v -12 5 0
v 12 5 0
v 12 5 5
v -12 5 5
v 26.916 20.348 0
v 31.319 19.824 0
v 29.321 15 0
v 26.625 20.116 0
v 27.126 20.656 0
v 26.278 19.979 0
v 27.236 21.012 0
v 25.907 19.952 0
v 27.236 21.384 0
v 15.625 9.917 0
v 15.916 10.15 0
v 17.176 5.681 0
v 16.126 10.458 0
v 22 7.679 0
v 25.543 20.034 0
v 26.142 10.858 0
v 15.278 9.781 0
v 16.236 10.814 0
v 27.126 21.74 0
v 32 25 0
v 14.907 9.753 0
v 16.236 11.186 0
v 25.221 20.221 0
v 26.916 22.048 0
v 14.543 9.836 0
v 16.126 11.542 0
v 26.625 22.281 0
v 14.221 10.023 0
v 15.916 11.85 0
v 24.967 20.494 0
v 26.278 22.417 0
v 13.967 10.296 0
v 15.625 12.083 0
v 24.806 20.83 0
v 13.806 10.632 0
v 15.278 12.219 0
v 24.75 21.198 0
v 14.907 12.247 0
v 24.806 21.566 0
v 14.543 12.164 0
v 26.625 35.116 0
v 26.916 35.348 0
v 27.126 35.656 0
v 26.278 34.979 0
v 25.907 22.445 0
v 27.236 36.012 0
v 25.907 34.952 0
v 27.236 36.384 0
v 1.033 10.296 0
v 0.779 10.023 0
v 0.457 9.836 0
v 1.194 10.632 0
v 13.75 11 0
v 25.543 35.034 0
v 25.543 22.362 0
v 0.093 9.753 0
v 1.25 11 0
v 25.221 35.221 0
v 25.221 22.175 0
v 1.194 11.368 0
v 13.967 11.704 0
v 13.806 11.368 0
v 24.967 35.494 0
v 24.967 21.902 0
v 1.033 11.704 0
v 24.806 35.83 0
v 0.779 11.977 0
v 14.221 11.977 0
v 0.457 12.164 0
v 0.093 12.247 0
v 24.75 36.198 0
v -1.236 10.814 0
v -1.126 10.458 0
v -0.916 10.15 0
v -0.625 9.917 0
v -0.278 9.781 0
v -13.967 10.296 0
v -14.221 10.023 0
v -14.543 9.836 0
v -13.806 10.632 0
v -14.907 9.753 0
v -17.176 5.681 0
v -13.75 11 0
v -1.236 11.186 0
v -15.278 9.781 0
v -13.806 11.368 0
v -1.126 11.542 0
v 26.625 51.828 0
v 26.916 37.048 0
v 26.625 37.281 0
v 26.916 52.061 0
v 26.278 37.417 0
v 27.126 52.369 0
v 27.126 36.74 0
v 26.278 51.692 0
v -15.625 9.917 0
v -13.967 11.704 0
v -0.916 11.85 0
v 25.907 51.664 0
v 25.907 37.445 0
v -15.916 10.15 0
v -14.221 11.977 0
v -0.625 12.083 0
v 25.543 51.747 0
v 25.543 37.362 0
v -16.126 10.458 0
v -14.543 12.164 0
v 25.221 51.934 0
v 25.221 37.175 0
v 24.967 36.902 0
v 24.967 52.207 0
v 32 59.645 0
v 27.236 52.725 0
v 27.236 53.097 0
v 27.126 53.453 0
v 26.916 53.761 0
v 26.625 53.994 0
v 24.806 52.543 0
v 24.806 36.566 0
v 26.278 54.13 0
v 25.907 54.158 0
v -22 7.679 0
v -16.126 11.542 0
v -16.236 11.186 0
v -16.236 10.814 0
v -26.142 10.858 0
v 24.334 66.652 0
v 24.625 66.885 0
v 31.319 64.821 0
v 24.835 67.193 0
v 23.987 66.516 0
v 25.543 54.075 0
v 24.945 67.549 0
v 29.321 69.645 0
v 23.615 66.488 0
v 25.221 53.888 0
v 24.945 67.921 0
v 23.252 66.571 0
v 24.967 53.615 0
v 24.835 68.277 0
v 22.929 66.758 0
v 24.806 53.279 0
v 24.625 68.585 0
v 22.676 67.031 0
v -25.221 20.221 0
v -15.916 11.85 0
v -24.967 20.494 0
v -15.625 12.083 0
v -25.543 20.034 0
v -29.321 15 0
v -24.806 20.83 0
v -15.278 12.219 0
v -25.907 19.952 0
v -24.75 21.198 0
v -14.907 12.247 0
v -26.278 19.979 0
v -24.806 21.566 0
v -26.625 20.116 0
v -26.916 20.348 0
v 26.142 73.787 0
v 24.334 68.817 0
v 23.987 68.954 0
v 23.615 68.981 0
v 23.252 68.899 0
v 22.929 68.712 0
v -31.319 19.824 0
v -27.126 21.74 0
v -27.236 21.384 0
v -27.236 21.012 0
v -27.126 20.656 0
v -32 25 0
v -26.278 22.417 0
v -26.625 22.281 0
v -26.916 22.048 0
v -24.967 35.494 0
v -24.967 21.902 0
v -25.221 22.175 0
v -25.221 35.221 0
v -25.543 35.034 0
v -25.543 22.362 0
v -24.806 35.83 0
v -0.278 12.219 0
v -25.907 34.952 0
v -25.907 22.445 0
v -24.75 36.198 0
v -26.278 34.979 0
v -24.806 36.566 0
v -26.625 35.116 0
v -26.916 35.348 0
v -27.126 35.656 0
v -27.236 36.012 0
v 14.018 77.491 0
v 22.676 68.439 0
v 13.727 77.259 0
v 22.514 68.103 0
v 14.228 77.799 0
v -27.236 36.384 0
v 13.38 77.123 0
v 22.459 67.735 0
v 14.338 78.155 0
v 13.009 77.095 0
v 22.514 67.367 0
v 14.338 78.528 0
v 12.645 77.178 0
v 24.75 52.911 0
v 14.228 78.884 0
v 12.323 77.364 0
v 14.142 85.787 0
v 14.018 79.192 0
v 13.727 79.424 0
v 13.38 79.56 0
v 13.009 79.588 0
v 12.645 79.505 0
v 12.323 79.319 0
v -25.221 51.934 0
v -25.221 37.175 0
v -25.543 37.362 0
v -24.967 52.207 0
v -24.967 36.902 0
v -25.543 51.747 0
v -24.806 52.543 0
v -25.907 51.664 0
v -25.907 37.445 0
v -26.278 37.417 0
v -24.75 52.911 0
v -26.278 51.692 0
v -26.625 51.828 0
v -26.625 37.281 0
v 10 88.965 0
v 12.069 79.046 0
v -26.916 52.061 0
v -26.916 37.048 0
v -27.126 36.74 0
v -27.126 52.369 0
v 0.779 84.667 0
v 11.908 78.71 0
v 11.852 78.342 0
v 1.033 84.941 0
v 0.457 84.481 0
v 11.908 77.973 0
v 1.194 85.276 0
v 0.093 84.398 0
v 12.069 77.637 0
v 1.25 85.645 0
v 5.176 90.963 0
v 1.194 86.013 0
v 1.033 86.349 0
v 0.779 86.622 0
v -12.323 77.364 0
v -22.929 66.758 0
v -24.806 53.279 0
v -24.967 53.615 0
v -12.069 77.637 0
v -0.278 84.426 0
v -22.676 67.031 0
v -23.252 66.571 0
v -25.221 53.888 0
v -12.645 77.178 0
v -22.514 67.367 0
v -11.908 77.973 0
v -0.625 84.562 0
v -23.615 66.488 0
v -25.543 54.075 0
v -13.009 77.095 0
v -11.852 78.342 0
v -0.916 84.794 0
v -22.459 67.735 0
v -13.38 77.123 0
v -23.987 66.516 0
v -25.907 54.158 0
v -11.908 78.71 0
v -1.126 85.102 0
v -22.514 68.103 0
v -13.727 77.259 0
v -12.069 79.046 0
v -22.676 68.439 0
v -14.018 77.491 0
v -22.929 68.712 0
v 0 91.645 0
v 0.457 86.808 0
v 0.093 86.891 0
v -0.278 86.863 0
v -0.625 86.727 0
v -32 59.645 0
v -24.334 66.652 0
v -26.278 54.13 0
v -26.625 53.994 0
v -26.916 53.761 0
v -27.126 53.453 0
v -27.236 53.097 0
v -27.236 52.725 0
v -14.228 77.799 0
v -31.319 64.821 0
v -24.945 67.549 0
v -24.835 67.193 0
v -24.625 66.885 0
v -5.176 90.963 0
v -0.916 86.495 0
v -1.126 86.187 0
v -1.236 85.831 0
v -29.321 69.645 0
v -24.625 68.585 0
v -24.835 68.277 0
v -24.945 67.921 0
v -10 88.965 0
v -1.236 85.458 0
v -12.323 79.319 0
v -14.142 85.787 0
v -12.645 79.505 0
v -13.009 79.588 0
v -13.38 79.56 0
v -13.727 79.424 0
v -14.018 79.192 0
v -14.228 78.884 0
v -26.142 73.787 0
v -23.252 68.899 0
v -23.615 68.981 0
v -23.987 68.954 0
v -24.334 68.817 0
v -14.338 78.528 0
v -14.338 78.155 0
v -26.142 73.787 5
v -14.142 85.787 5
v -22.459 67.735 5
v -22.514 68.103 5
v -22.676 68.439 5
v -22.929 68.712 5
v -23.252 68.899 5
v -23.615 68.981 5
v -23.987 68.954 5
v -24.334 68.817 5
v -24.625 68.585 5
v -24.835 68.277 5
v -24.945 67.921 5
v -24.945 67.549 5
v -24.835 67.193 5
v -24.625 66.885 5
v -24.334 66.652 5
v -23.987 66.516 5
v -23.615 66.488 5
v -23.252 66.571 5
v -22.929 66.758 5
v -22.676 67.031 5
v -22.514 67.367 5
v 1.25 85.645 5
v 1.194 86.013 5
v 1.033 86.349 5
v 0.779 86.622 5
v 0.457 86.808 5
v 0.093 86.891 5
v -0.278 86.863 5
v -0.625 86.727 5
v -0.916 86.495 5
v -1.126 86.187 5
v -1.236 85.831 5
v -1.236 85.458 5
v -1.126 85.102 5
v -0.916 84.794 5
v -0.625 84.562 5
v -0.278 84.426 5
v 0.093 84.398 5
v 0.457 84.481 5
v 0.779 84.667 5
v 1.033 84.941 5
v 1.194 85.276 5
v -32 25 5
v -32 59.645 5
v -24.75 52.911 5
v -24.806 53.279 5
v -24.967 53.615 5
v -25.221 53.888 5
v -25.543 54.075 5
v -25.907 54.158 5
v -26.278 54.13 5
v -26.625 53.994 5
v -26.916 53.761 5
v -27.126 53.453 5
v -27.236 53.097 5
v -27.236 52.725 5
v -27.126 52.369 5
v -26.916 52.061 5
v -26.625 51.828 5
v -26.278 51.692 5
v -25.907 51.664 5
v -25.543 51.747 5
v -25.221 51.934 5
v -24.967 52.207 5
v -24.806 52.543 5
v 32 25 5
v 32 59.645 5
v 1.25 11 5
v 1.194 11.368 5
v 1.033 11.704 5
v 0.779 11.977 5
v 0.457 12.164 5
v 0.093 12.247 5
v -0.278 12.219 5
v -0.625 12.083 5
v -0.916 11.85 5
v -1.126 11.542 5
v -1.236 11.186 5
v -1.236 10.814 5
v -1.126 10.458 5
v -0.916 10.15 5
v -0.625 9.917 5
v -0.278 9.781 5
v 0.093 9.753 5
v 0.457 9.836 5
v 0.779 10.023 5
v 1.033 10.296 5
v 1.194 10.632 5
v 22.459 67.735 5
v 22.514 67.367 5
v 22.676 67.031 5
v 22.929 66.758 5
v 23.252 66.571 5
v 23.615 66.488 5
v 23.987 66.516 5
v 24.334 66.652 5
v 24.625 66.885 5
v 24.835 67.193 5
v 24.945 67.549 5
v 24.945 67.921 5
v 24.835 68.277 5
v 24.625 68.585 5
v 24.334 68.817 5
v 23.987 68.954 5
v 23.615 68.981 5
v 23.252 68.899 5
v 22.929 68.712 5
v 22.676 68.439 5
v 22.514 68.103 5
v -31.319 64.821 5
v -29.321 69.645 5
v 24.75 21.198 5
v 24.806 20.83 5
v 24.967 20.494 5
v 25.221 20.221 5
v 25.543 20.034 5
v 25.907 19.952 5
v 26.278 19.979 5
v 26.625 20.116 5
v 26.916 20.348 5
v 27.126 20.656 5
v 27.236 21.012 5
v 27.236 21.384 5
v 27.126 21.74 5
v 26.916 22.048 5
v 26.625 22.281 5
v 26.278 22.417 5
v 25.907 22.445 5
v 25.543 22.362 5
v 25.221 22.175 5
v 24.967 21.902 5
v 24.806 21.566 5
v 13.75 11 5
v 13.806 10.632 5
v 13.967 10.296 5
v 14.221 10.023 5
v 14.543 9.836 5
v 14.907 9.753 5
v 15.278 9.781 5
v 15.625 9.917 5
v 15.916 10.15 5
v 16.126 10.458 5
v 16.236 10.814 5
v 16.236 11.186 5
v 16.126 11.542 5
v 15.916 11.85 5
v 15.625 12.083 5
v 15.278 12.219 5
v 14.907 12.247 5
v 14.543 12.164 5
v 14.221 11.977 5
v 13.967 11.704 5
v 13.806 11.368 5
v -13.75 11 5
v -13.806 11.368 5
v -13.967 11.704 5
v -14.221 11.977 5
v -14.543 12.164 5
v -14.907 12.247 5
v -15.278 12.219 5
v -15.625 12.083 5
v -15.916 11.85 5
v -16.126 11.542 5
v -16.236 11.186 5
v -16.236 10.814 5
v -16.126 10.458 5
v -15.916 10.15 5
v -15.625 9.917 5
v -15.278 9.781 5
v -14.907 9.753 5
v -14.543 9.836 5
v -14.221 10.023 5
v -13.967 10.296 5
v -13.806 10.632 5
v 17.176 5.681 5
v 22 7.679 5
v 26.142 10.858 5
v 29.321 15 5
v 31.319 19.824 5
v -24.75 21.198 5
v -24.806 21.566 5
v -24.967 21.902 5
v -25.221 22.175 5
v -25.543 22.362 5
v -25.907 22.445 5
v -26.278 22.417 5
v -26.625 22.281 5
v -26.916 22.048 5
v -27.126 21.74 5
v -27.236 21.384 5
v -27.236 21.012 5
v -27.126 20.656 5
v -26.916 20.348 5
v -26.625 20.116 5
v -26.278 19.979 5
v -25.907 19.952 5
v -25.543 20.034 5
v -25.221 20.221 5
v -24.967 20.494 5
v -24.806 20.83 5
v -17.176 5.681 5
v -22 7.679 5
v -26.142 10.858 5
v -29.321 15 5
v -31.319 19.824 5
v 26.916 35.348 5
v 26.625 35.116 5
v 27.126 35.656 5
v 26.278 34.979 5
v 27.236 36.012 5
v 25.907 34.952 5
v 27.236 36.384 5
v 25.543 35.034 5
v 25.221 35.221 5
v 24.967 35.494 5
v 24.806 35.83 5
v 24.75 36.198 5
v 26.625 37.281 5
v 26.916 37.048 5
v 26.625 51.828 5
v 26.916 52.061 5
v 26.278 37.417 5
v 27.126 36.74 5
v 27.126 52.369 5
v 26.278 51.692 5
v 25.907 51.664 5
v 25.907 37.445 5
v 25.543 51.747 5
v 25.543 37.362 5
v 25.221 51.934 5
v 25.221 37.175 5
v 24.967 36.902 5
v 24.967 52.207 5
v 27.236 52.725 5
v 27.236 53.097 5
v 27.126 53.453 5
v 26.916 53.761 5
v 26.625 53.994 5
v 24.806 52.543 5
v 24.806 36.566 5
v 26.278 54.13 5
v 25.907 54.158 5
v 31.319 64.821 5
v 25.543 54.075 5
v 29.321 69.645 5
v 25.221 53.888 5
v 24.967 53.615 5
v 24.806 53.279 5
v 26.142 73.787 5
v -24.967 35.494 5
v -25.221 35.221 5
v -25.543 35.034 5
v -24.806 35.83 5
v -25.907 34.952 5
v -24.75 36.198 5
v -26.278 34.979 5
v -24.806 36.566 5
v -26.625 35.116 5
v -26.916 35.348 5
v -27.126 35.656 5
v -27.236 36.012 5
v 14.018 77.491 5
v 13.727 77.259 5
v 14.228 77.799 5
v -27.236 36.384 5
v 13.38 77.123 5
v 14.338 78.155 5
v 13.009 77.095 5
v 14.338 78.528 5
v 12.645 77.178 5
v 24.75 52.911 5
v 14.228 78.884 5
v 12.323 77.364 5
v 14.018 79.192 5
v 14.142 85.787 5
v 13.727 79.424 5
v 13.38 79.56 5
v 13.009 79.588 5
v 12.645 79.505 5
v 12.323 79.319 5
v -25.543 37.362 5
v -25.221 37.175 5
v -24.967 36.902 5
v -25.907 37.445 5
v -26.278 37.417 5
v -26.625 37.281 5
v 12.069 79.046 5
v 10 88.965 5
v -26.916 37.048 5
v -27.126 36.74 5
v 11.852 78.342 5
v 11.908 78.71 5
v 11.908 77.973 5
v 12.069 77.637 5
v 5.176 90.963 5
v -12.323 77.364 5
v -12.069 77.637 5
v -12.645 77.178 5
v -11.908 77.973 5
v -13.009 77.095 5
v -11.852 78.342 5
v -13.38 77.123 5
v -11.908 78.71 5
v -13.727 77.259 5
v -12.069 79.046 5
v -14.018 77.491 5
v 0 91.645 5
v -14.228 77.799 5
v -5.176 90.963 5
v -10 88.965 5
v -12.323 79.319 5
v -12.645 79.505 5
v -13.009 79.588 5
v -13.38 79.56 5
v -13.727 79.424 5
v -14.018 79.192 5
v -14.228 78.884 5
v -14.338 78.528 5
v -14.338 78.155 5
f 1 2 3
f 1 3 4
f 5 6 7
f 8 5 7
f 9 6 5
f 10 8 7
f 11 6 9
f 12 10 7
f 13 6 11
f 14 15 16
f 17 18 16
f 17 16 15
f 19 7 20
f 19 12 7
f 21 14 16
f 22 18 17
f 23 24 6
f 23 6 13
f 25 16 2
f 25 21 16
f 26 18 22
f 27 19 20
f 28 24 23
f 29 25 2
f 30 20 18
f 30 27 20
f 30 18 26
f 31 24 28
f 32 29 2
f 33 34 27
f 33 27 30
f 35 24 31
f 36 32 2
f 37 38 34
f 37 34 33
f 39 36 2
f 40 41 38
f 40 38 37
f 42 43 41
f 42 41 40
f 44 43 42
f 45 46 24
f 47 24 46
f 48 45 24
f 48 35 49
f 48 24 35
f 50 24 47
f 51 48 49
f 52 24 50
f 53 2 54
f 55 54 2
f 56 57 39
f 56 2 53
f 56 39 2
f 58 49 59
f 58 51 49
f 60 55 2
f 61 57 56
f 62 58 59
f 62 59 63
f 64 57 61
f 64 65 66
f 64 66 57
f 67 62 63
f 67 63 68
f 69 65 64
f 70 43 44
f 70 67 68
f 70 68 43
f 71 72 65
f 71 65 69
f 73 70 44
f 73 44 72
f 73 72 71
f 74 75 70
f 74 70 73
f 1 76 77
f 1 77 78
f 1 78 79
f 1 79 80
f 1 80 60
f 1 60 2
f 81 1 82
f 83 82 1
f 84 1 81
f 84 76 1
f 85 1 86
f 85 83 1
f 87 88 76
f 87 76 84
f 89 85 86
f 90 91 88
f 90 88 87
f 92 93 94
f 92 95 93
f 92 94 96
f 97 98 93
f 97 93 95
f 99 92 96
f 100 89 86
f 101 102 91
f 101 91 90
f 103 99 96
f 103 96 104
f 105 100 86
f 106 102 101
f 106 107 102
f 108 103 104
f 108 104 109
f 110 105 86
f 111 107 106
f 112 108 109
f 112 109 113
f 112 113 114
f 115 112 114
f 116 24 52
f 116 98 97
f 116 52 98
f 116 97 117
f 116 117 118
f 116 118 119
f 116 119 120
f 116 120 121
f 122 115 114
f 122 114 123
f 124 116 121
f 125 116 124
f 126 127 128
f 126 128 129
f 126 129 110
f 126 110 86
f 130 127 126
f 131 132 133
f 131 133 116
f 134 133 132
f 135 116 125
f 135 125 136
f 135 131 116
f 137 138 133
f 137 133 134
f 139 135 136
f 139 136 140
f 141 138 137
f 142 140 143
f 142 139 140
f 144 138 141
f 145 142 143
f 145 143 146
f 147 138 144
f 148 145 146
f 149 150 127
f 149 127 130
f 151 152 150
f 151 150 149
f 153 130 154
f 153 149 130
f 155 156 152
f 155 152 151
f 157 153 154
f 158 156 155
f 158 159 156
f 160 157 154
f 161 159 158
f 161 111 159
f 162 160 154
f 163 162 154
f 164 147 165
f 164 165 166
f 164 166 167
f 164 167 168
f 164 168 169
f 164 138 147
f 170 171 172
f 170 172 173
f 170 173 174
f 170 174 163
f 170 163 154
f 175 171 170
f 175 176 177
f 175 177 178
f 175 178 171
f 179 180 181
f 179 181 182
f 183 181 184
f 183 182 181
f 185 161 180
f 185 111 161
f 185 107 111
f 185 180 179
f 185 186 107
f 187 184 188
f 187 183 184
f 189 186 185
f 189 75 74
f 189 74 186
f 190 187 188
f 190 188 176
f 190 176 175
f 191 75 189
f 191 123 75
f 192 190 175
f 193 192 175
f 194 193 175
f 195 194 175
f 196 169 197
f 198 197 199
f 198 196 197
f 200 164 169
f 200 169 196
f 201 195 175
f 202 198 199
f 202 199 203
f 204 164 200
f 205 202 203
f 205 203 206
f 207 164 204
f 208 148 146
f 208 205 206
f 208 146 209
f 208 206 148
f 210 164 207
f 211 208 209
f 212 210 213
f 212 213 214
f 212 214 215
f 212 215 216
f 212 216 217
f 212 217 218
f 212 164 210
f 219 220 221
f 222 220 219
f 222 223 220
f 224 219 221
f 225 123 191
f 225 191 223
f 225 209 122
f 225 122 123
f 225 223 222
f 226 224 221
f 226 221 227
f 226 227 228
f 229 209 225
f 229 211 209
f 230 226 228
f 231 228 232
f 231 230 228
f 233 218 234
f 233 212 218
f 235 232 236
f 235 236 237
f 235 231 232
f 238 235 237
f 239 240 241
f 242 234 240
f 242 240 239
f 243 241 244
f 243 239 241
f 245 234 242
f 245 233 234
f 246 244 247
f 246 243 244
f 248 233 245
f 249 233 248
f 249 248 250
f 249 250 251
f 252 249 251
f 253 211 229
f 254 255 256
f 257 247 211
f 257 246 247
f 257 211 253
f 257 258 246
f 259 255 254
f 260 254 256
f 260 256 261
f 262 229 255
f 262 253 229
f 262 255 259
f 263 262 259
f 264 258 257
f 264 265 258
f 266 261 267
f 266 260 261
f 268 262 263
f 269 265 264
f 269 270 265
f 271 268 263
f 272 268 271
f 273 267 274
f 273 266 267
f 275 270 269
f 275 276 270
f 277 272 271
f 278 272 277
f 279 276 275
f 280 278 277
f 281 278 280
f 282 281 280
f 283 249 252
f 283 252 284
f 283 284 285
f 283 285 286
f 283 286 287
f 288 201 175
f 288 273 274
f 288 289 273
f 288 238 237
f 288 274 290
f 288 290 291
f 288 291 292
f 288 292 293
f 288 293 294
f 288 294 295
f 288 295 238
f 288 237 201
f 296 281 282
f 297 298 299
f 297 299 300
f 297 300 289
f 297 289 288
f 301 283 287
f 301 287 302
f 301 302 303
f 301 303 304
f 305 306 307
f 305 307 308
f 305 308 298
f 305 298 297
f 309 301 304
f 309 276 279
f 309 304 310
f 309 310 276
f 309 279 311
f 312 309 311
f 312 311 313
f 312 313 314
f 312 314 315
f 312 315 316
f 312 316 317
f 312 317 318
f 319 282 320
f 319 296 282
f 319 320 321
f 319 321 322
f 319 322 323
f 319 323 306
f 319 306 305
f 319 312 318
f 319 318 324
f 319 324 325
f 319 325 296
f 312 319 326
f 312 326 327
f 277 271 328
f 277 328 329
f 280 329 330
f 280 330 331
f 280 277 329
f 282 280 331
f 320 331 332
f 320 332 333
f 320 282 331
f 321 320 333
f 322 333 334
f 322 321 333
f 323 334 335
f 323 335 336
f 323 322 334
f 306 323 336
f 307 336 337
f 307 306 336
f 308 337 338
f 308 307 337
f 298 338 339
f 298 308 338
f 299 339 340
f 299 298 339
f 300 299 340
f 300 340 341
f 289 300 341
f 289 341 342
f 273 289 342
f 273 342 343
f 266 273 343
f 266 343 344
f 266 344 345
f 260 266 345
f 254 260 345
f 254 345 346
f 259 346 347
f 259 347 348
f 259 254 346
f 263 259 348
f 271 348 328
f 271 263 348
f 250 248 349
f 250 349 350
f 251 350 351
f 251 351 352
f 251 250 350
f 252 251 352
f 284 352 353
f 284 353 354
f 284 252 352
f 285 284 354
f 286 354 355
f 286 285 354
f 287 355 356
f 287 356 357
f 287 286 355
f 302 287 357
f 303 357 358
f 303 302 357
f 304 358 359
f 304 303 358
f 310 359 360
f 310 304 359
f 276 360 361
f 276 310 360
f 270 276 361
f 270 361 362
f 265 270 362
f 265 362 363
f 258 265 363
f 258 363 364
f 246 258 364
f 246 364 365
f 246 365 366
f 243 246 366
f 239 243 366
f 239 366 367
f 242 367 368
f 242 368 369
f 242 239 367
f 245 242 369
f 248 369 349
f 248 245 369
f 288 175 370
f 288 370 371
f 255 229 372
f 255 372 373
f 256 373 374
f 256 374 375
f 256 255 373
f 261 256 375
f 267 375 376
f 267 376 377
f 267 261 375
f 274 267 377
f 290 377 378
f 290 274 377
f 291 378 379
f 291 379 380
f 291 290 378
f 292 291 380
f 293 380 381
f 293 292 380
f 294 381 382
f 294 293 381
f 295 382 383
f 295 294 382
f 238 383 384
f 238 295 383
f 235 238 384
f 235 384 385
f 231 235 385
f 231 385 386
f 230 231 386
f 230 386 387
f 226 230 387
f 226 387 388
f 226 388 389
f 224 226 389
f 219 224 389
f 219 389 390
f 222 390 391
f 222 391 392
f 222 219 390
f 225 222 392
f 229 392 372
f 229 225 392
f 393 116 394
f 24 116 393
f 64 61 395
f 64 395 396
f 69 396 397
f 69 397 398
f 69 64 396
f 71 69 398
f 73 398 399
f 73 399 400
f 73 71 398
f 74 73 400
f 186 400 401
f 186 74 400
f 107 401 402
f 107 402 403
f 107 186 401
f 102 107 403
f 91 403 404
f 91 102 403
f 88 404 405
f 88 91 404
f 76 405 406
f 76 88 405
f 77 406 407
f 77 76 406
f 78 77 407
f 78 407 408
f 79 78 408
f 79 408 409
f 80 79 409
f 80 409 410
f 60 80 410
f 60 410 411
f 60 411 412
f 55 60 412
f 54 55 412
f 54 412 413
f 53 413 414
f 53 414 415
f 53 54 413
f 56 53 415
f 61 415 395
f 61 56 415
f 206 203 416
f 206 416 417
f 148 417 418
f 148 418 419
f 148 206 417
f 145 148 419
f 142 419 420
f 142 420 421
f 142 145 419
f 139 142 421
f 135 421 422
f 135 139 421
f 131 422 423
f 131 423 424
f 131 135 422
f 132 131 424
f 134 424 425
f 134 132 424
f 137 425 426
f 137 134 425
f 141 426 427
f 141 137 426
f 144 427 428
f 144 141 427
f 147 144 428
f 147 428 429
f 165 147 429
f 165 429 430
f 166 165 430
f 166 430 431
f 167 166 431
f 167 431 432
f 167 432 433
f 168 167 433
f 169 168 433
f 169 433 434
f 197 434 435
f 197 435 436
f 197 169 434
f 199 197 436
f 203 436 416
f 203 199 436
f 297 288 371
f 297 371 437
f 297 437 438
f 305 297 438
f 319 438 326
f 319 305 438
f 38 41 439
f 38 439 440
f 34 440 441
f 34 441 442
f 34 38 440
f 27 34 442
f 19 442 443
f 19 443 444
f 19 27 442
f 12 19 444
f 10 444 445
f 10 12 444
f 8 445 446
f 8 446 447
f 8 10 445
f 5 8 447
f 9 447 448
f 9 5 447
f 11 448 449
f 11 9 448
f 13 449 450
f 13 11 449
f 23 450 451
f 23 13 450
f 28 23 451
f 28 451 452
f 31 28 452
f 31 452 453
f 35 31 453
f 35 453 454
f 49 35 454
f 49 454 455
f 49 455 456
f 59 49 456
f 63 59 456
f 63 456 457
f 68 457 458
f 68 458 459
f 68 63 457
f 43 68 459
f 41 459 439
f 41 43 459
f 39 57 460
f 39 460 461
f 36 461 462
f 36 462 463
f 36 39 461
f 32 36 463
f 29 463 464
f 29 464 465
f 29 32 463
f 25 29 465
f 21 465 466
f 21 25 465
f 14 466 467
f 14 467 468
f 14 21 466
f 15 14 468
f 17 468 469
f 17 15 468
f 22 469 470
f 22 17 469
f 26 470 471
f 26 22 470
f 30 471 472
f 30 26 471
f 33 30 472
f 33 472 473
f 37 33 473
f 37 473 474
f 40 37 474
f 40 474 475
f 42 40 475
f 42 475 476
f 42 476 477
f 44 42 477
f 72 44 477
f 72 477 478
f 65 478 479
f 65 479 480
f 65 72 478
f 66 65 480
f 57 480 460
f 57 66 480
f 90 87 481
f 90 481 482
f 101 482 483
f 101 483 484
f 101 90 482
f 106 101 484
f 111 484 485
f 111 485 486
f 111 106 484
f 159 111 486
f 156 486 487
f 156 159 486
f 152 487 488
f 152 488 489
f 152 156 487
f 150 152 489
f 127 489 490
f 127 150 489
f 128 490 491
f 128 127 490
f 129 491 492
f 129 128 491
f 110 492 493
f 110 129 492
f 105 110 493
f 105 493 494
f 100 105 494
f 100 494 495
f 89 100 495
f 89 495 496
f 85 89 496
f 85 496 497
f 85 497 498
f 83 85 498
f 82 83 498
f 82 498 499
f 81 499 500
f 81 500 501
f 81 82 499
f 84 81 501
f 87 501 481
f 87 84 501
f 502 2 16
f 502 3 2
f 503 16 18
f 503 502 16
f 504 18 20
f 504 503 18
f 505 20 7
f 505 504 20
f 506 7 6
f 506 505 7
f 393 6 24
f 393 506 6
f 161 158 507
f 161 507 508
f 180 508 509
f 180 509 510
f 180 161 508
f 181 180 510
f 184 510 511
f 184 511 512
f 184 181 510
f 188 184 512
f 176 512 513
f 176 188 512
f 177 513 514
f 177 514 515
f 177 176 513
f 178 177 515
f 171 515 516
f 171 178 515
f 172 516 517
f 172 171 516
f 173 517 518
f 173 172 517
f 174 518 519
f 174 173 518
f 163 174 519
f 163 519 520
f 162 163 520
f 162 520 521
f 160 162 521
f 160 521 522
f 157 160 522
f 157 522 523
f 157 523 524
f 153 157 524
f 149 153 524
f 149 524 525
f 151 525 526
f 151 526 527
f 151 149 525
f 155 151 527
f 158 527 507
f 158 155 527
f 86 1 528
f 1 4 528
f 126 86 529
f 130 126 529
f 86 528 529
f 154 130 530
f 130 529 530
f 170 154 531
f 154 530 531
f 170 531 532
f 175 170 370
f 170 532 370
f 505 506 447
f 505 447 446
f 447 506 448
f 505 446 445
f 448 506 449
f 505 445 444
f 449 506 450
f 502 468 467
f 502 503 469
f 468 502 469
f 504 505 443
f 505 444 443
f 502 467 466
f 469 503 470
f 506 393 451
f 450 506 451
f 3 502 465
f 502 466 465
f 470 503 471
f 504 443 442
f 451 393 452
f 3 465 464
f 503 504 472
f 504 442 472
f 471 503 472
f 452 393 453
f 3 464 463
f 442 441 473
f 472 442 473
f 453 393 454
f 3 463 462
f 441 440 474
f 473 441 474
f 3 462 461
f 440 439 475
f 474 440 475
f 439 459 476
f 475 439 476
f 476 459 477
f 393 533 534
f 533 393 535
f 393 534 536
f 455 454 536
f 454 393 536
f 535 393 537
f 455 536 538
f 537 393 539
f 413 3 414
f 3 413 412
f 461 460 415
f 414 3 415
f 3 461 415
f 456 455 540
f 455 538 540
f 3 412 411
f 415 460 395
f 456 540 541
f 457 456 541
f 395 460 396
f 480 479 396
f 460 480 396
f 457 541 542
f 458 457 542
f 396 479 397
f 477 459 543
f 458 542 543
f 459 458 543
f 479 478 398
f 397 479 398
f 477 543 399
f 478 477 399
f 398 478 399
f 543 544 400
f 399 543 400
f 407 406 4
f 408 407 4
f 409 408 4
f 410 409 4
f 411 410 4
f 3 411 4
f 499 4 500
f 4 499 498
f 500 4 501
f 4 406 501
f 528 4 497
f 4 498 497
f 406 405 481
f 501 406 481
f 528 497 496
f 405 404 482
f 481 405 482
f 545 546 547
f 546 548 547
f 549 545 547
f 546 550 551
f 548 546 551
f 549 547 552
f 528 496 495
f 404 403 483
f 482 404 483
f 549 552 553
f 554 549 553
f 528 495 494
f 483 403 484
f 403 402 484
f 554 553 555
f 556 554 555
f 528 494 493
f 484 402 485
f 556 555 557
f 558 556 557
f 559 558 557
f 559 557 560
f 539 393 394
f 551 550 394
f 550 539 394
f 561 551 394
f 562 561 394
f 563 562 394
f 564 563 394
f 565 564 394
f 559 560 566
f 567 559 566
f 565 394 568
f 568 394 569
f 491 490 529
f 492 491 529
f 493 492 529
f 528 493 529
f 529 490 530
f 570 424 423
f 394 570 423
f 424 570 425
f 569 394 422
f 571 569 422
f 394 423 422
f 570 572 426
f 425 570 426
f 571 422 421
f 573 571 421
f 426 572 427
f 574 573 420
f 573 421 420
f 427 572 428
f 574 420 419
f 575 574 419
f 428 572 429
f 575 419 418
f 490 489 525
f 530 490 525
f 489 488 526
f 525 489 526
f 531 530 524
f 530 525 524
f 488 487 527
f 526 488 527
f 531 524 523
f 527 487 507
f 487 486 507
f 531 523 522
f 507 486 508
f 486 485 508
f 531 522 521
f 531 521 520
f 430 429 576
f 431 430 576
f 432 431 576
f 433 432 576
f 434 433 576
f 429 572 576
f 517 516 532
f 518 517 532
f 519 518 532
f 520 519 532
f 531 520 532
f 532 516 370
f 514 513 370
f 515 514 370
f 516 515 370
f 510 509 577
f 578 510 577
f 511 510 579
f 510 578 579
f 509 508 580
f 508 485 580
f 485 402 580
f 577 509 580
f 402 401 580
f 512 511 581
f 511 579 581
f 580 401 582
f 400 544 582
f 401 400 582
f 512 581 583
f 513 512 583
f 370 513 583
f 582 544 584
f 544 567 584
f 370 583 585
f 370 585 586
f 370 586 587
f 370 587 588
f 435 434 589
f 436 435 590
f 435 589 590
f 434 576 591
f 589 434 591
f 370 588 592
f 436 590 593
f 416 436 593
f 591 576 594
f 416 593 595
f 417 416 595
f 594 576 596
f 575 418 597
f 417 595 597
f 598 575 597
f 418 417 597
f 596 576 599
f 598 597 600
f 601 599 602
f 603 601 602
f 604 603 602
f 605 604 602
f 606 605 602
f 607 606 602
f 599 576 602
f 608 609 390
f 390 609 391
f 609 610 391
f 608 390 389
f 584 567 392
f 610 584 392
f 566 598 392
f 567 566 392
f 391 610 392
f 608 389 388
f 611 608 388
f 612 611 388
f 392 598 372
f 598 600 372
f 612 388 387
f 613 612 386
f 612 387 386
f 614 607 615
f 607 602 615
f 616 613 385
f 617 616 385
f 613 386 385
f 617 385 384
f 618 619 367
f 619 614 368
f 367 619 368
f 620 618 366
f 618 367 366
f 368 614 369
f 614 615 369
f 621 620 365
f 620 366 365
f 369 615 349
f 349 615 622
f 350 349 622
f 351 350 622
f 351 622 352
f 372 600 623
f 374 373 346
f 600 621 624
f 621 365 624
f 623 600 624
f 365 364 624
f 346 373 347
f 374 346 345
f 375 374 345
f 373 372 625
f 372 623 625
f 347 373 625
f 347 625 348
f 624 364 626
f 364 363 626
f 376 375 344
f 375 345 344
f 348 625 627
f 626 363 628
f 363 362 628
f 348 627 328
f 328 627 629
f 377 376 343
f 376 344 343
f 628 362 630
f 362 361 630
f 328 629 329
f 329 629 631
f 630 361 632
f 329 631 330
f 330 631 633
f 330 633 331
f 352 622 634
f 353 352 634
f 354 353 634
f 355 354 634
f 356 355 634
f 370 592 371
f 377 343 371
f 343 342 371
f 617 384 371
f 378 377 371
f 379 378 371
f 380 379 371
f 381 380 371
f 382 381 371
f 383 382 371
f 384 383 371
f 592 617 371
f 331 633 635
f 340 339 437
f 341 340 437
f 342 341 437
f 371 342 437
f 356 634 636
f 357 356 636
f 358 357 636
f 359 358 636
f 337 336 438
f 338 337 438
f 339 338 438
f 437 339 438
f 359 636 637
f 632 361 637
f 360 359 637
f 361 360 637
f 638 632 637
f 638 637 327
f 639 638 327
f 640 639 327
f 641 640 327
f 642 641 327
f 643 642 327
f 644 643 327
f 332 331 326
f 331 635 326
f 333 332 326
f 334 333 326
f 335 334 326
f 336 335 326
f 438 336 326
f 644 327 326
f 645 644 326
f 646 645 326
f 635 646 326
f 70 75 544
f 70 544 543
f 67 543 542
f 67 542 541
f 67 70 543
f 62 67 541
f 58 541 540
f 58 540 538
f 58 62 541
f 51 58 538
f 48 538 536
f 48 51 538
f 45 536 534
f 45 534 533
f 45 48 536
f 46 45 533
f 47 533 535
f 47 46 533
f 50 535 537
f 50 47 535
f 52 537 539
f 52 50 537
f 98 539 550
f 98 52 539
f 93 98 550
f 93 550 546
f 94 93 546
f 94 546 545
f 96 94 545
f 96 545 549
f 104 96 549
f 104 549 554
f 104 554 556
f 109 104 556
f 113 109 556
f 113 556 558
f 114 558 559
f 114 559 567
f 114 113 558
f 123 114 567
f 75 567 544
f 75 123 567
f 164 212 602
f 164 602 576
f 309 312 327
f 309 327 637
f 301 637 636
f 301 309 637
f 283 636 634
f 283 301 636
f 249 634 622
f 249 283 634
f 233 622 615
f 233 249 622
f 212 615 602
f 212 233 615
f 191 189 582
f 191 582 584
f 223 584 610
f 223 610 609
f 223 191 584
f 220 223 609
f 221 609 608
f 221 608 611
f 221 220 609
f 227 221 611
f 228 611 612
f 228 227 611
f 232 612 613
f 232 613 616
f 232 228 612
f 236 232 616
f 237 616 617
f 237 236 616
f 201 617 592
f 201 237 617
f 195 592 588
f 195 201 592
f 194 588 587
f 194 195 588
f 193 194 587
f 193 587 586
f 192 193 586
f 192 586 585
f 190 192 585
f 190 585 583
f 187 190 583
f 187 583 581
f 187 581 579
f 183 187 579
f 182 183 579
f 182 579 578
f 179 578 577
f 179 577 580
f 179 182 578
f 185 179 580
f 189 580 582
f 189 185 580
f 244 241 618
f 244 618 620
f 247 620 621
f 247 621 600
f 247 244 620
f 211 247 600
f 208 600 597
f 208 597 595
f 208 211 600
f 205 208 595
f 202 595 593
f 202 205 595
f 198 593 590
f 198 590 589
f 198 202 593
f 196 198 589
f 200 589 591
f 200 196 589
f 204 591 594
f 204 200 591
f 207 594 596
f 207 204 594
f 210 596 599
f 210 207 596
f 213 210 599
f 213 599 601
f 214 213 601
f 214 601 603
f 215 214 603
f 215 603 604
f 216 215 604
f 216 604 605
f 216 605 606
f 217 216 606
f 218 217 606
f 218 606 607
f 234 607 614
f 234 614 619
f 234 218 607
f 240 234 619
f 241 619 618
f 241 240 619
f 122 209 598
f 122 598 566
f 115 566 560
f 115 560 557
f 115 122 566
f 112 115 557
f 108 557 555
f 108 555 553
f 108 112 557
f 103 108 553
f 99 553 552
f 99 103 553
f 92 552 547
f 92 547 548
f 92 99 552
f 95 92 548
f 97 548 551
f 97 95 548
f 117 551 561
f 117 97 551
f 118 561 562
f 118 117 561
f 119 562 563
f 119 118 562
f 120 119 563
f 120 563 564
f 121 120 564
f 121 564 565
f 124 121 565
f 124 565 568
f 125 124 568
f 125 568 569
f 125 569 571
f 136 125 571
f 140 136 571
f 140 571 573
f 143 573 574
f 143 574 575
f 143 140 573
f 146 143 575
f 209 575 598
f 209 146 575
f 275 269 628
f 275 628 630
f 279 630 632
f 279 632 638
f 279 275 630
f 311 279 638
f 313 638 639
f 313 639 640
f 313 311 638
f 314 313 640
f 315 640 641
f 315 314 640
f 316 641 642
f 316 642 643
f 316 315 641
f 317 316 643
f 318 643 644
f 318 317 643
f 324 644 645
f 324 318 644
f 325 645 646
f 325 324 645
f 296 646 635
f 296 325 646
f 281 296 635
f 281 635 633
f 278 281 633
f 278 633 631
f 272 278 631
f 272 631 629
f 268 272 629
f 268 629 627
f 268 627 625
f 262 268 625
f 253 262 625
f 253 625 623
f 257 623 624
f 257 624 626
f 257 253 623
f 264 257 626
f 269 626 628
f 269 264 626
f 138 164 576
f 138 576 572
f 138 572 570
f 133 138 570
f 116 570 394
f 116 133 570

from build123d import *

# Parameters (mm, degrees)
SKETCH1_R           = 1.25
BOSS_EXTRUDE1_DEPTH = 5
FILLET1_R           = 20


with BuildPart() as part:
    # Sketch1 → Boss-Extrude1 (new body)
    with BuildSketch(Plane.XY):
        with BuildLine():
            Line((32, 5), (-32, 5))
            Line((-32, 5), (-32, 59.644660941))
            ThreePointArc((-32, 59.644660941), (-30.47759065, 67.298329588), (-26.142135624, 73.786796564))
            Line((-26.142135624, 73.786796564), (-14.142135624, 85.786796564))
            ThreePointArc((-14.142135624, 85.786796564), (0, 91.644660941), (14.142135624, 85.786796564))
            Line((14.142135624, 85.786796564), (26.142135624, 73.786796564))
            ThreePointArc((26.142135624, 73.786796564), (30.47759065, 67.298329588), (32, 59.644660941))
            Line((32, 59.644660941), (32, 5))
        make_face()
        with Locations((0, 85.644660941)):
            Circle(SKETCH1_R, mode=Mode.SUBTRACT)
        with Locations((-13.102089171, 78.341561643)):
            Circle(SKETCH1_R, mode=Mode.SUBTRACT)
        with Locations((-23.708690889, 67.734959925)):
            Circle(SKETCH1_R, mode=Mode.SUBTRACT)
        with Locations((-26, 52.910996131)):
            Circle(SKETCH1_R, mode=Mode.SUBTRACT)
        with Locations((-26, 36.198039027)):
            Circle(SKETCH1_R, mode=Mode.SUBTRACT)
        with Locations((-26, 21.198039027)):
            Circle(SKETCH1_R, mode=Mode.SUBTRACT)
        with Locations((0, 11)):
            Circle(SKETCH1_R, mode=Mode.SUBTRACT)
        with Locations((-15, 11)):
            Circle(SKETCH1_R, mode=Mode.SUBTRACT)
        with Locations(Location((13.102089171, 78.341561643, 0), (0, 0, 180))):
            Circle(SKETCH1_R, mode=Mode.SUBTRACT)
        with Locations(Location((23.708690889, 67.734959925, 0), (0, 0, 180))):
            Circle(SKETCH1_R, mode=Mode.SUBTRACT)
        with Locations(Location((26, 52.910996131, 0), (0, 0, 180))):
            Circle(SKETCH1_R, mode=Mode.SUBTRACT)
        with Locations(Location((26, 36.198039027, 0), (0, 0, 180))):
            Circle(SKETCH1_R, mode=Mode.SUBTRACT)
        with Locations(Location((26, 21.198039027, 0), (0, 0, 180))):
            Circle(SKETCH1_R, mode=Mode.SUBTRACT)
        with Locations(Location((15, 11, 0), (0, 0, 180))):
            Circle(SKETCH1_R, mode=Mode.SUBTRACT)
    extrude(amount=BOSS_EXTRUDE1_DEPTH)

    # Fillet1
    fillet1_edges = [part.edges().sort_by_distance(p)[0] for p in [
        (32, 5, 2.5),
        (-32, 5, 2.5),
    ]]
    fillet(fillet1_edges, radius=FILLET1_R)


solid = part.part
